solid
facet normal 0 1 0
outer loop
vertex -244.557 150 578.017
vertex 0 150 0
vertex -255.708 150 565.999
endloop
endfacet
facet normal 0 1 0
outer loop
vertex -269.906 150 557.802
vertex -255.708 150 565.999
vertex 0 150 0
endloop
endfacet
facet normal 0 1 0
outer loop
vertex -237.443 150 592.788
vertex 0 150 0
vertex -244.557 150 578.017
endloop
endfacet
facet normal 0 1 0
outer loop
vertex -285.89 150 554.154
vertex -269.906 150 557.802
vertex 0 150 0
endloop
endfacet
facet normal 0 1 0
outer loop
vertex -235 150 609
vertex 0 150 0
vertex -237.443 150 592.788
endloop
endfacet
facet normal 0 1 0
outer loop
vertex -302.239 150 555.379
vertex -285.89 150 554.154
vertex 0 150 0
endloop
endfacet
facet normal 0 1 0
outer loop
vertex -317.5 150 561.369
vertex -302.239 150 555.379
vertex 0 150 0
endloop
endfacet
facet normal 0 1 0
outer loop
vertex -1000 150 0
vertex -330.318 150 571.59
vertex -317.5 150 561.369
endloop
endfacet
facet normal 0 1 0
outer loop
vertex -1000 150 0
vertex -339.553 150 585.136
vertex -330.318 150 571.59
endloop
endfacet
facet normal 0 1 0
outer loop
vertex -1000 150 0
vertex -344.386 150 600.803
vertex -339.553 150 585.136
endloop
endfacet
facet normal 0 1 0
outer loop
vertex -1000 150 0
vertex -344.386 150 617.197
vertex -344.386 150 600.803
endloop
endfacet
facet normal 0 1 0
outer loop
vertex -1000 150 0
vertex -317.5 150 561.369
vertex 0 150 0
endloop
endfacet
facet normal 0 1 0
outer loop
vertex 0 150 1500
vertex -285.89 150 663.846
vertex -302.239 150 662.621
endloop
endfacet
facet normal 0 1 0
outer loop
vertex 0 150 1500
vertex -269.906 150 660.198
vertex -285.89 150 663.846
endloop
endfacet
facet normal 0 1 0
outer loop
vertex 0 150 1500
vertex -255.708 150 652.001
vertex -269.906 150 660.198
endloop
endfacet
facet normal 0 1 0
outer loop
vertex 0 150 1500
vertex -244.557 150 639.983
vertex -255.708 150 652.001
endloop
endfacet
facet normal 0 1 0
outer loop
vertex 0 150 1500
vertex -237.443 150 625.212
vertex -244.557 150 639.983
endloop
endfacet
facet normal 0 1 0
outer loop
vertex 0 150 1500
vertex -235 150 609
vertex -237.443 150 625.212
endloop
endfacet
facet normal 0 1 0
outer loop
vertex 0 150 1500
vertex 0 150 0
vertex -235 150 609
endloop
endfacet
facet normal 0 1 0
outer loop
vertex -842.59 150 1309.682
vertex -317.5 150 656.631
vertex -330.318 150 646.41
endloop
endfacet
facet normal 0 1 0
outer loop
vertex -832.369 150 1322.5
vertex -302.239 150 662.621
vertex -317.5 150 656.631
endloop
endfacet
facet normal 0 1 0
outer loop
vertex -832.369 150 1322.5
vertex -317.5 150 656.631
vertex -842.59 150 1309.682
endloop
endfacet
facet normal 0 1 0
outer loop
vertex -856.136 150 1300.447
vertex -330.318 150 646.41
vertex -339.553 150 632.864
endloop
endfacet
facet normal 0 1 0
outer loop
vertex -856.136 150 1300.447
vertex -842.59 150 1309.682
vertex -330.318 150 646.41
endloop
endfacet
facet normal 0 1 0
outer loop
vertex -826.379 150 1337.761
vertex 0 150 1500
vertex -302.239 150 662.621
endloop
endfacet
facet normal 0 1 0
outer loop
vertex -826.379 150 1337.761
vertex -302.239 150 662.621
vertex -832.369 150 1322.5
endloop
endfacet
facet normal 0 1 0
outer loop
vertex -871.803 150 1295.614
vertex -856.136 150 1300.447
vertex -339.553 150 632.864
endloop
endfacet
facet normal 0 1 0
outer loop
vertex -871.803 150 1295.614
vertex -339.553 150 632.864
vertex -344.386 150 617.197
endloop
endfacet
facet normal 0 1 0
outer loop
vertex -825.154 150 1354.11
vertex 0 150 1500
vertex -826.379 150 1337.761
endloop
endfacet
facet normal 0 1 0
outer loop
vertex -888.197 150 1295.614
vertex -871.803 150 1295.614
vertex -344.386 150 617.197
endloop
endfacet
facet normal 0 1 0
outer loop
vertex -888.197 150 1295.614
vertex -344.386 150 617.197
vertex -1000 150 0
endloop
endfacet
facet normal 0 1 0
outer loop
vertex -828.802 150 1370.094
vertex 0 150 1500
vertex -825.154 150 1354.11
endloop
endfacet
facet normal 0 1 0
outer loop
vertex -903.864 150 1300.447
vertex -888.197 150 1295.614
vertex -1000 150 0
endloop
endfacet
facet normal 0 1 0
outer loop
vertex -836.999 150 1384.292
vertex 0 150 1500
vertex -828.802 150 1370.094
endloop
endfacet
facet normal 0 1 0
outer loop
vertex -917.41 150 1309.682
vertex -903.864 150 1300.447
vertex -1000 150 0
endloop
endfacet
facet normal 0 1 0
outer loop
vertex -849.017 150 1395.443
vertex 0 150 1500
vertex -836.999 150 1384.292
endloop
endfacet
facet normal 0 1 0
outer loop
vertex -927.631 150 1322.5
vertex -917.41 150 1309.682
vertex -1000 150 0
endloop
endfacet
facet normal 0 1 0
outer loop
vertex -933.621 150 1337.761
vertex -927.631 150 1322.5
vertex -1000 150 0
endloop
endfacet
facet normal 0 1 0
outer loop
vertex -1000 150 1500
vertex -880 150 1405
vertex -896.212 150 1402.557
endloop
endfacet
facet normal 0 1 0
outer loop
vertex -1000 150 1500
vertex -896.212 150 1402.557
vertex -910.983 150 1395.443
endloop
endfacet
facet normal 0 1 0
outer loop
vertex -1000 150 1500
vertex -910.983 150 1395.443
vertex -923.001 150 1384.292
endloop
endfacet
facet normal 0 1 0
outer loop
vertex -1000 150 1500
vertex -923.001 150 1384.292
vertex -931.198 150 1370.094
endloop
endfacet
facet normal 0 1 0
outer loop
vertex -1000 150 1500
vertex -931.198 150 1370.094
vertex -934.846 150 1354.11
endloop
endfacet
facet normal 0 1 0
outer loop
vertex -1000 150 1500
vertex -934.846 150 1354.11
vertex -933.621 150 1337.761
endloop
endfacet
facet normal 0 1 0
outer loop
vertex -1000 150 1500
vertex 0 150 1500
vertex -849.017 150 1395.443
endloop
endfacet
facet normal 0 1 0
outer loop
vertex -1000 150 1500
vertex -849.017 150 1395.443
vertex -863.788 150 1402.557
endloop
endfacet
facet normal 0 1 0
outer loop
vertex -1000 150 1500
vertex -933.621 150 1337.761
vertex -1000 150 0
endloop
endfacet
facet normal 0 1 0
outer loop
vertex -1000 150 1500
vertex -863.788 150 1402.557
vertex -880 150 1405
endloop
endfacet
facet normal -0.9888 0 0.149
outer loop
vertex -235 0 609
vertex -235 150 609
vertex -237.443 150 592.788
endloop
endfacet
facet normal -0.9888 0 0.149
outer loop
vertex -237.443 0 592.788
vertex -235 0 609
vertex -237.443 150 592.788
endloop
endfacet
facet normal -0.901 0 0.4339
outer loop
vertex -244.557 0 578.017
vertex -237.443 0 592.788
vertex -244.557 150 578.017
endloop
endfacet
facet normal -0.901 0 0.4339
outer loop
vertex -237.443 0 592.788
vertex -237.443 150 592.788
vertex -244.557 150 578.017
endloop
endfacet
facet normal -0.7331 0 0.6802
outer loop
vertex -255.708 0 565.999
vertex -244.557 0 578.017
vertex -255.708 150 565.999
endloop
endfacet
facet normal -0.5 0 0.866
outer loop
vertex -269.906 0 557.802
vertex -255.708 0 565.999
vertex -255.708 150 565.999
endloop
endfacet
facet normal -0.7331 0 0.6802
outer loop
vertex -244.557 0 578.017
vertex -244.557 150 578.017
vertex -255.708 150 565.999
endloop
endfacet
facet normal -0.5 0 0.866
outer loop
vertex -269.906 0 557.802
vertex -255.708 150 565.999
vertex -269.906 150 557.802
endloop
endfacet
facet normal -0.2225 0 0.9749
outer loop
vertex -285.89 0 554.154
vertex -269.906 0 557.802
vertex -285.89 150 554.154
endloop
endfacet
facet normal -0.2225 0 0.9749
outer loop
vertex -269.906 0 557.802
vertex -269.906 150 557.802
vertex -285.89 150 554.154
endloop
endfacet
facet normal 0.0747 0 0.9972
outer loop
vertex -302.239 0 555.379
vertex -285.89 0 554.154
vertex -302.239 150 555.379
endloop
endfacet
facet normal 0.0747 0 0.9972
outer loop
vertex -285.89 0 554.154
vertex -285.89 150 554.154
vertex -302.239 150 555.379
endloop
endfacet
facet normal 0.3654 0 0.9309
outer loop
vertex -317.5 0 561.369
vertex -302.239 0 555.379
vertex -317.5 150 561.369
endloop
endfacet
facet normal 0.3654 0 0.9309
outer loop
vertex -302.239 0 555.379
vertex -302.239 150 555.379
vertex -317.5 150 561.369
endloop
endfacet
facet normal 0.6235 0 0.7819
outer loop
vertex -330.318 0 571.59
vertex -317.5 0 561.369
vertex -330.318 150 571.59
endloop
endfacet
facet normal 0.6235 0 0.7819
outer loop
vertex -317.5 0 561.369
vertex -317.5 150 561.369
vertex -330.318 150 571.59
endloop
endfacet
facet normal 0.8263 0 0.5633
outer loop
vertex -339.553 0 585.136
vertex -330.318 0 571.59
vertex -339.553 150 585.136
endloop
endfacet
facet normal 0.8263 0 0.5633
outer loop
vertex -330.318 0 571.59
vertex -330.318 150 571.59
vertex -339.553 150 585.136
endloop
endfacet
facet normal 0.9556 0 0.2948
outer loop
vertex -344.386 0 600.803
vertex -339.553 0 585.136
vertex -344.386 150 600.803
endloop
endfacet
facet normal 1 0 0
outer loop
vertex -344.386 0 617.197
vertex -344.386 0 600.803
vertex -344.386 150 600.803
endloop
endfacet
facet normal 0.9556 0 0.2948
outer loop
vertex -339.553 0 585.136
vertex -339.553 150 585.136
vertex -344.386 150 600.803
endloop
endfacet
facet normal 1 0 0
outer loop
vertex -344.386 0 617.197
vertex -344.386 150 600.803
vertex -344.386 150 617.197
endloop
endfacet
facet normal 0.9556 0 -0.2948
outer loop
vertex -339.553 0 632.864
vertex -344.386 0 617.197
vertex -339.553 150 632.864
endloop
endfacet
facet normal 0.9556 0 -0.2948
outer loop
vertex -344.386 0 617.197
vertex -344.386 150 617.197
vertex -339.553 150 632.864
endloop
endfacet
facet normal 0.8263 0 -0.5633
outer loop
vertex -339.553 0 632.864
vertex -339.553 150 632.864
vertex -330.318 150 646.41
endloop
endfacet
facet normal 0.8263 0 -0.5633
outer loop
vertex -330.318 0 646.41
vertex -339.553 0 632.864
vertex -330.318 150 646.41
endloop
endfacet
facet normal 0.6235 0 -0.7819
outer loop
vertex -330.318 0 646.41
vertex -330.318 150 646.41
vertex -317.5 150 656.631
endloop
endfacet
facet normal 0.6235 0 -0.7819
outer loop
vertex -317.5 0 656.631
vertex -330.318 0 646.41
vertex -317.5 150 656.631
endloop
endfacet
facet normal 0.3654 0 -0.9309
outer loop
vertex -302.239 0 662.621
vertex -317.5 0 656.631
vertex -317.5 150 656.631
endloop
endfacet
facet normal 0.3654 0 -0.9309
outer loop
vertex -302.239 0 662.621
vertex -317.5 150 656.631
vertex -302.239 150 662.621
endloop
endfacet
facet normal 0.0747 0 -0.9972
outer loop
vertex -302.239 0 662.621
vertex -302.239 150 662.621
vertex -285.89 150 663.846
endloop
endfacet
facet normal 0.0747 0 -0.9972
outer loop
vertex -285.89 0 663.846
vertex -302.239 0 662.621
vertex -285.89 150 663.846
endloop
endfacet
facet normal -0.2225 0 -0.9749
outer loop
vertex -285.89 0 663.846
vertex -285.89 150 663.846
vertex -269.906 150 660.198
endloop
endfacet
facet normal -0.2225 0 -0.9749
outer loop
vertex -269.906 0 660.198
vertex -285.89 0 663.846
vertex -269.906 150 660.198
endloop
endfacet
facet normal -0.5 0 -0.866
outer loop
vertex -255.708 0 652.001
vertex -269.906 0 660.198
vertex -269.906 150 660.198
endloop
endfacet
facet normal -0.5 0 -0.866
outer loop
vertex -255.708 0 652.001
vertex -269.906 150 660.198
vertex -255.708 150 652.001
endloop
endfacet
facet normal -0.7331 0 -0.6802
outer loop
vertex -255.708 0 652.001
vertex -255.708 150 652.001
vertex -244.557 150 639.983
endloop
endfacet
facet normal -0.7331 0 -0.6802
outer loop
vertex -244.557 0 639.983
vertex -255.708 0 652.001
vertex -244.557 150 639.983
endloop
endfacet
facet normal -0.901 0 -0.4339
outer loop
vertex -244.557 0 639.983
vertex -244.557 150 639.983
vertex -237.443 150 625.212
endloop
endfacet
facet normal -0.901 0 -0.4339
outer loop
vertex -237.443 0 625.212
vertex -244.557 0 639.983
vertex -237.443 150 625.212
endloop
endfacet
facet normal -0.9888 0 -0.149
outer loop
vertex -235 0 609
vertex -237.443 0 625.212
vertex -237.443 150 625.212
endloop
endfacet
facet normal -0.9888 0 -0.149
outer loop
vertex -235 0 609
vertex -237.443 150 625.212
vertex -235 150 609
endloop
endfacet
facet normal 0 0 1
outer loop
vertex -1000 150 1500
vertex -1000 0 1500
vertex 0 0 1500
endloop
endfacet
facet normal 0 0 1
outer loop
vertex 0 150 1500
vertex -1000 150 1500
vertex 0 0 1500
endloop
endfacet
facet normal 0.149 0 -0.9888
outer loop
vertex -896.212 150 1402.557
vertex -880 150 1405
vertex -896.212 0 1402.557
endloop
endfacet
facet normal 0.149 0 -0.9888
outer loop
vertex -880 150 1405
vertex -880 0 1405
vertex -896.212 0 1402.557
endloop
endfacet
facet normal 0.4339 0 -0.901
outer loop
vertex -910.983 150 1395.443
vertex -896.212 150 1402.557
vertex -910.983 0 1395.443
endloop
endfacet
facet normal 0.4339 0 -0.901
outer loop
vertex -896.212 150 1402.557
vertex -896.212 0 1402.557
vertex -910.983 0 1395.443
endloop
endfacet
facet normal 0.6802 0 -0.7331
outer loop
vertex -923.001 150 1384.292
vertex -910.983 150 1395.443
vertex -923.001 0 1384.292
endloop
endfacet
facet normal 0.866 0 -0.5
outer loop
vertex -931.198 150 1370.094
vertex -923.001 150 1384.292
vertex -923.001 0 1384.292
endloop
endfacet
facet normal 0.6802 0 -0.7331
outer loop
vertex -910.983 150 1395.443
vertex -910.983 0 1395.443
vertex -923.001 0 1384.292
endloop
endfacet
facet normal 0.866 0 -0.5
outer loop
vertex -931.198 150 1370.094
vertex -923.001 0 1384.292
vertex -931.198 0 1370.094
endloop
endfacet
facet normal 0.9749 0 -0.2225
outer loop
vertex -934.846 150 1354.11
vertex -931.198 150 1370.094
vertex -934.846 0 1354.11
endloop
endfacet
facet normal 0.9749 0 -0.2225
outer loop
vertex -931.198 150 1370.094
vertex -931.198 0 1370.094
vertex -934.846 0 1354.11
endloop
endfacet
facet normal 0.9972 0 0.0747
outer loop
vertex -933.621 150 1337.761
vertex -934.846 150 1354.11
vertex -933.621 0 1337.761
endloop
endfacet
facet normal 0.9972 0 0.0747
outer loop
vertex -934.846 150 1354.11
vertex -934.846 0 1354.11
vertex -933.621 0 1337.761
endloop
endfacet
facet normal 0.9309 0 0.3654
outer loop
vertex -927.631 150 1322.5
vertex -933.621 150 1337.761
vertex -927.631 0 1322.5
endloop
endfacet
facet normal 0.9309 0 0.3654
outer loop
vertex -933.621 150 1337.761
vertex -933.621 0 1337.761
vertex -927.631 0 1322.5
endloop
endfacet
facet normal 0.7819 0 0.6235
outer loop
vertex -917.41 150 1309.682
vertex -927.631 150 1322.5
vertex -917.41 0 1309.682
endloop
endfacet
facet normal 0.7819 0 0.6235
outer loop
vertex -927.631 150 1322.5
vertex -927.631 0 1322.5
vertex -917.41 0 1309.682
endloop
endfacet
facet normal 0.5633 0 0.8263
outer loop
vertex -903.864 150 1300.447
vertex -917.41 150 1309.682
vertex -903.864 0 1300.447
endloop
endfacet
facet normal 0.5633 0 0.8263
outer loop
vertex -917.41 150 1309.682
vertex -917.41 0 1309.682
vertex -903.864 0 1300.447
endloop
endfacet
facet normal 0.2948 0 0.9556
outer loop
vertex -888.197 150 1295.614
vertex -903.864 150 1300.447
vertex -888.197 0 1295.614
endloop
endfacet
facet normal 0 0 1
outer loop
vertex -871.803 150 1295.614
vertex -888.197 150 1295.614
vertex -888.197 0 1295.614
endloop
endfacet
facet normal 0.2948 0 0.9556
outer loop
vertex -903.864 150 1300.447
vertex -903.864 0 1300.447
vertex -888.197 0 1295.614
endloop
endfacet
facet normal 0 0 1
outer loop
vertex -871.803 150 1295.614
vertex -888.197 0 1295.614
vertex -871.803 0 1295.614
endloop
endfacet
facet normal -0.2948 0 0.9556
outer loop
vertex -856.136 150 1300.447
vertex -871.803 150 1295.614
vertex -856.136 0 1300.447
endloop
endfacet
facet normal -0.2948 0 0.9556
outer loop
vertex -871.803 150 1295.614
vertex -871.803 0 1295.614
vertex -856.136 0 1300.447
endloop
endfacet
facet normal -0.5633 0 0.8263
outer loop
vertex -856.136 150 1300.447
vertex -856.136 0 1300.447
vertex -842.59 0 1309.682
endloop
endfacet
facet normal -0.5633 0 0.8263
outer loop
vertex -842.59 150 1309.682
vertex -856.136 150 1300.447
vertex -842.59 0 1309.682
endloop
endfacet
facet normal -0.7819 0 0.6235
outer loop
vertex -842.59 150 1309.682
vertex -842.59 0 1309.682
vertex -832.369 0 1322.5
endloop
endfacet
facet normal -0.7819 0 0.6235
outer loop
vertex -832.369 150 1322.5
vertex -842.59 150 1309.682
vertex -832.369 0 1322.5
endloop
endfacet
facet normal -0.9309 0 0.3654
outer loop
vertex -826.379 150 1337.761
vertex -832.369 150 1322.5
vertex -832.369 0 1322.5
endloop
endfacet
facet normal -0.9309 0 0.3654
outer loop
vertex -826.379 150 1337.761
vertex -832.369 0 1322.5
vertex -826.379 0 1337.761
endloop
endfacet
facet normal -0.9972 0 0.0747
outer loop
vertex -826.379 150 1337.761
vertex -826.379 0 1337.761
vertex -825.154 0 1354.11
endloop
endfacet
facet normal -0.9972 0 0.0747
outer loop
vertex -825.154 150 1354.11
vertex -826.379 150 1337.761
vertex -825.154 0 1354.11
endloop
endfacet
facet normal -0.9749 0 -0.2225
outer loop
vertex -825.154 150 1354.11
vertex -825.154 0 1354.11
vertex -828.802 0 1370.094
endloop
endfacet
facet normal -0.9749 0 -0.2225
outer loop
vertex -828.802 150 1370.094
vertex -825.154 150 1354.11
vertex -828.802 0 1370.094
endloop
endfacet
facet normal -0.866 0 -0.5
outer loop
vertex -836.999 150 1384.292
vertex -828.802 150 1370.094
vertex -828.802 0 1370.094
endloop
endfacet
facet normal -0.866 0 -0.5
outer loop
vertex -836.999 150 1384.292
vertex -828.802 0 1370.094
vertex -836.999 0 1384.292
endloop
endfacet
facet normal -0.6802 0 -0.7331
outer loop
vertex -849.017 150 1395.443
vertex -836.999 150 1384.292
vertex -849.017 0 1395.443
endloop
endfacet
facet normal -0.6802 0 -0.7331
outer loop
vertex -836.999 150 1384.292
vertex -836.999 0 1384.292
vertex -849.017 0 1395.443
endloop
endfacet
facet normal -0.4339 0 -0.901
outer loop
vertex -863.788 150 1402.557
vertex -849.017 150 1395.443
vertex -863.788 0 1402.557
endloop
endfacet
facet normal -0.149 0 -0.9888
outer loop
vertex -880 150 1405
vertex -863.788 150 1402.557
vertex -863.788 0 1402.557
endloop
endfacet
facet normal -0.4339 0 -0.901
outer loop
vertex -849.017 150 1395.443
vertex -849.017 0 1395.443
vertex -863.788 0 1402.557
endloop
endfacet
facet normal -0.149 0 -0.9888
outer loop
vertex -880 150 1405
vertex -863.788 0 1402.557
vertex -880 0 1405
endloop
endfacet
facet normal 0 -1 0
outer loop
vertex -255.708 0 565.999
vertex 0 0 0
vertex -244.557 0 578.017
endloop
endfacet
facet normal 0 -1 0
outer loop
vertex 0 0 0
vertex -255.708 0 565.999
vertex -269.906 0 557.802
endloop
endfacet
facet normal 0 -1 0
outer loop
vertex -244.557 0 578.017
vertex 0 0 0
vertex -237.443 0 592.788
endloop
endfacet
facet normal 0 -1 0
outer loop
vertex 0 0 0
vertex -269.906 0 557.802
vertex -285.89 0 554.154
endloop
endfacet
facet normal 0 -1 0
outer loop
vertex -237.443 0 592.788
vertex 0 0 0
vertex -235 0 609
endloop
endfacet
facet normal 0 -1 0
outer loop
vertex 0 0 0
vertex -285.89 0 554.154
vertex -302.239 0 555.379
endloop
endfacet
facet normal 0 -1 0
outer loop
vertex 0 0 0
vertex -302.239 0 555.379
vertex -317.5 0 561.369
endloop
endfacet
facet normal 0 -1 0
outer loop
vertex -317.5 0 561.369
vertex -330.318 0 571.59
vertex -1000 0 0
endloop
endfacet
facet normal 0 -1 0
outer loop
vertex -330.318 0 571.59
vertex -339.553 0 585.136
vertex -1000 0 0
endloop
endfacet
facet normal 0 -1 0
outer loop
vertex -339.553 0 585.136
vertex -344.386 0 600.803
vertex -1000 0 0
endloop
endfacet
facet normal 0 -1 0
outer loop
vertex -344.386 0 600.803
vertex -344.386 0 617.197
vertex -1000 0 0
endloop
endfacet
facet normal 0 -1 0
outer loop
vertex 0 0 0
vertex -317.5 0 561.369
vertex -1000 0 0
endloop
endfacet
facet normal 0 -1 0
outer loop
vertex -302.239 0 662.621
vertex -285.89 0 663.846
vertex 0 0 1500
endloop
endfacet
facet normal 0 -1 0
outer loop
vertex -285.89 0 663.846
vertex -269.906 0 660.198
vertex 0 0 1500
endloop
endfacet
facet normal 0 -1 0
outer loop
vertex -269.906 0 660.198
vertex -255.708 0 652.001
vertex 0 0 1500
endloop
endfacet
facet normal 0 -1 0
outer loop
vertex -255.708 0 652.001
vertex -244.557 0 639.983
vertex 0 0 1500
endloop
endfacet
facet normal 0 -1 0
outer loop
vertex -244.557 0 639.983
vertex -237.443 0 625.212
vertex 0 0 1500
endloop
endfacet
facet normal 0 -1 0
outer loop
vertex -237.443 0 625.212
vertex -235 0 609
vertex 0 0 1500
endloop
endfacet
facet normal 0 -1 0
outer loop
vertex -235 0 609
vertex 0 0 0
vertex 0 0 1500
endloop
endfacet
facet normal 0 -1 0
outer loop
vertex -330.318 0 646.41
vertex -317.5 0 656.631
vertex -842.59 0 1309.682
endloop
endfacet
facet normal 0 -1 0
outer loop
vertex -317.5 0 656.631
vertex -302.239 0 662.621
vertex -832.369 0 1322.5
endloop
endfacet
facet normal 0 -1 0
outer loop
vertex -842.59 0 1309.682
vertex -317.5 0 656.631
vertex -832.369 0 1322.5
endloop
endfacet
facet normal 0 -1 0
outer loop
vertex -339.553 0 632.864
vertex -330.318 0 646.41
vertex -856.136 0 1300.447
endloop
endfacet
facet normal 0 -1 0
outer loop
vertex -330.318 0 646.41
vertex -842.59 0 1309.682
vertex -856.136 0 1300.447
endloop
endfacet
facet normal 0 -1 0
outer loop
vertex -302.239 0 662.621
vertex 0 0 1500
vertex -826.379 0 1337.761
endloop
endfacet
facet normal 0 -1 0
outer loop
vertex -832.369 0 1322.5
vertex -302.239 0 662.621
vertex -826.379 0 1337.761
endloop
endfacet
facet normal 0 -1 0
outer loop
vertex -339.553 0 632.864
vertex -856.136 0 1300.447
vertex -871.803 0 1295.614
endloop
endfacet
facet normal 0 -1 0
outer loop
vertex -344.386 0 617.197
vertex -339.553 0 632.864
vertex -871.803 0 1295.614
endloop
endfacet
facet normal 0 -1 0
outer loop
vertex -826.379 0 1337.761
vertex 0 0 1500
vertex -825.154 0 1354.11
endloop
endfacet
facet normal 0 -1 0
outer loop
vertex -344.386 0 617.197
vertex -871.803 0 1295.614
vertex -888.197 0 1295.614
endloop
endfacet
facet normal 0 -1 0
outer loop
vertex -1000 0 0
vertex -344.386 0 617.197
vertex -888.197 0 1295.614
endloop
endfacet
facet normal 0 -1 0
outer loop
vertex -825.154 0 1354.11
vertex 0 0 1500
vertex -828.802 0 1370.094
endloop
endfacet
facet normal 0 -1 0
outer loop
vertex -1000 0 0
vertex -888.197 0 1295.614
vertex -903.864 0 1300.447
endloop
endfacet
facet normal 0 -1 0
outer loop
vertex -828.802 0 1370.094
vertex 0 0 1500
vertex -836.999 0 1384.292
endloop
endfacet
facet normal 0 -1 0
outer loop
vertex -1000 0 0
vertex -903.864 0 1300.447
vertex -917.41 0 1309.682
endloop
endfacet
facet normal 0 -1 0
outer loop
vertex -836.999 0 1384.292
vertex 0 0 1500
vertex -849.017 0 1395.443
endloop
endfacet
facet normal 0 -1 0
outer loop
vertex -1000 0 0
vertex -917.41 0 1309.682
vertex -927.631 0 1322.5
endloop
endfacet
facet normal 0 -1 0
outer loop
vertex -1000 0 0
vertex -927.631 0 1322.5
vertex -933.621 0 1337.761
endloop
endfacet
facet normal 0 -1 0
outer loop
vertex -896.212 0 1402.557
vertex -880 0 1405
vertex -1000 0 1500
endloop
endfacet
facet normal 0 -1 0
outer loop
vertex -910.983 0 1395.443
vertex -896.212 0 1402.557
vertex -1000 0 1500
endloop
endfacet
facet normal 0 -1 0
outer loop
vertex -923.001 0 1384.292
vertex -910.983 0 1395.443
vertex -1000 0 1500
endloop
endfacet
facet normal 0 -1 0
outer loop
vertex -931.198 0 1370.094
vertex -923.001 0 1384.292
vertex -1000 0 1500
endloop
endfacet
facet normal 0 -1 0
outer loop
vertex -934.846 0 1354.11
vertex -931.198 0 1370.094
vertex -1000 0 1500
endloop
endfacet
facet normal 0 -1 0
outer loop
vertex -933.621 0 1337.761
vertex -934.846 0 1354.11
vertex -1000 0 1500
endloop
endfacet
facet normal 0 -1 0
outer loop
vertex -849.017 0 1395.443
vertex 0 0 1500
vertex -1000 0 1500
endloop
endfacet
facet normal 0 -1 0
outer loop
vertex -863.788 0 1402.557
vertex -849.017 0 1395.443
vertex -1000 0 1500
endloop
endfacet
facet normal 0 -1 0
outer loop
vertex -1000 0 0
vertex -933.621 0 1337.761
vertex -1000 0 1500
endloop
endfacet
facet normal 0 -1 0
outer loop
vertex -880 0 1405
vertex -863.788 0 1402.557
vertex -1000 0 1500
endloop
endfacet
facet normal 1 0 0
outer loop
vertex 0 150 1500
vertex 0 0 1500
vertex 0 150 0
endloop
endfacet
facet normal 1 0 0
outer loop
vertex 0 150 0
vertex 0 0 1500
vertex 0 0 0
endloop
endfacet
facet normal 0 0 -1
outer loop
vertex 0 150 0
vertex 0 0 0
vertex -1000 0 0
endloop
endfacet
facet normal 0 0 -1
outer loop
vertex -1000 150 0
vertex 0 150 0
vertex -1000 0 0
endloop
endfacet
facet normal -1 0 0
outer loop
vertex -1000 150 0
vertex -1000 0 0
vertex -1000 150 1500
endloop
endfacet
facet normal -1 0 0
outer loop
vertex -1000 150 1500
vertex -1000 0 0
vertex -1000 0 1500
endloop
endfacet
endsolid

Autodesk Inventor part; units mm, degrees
ref_plane "YZ Plane" through (0, 0, 0) normal (1, 0, 0) x (0, 1, 0)
ref_plane "XZ Plane" through (0, 0, 0) normal (0, 1, 0) x (-1, 0, 0)
ref_plane "XY Plane" through (0, 0, 0) normal (0, 0, 1) x (1, 0, 0)
sketch "Sketch1" plane through (0, 0, 0) normal (0, 1, 0) x (-1, 0, 0)
  line L0 (0, 0) -> (1000, 0)
  line L1 (1000, 0) -> (1000, 1500)
  line L2 (1000, 1500) -> (0, 1500)
  line L3 (0, 1500) -> (0, 0)
  dimension "d0" = 1000
  dimension "d1" = 1500
extrude "base" add sketch "Sketch1" along normal blind 150
sketch "Sketch2" plane through (0, 150, 0) normal (0, 1, 0) x (1, 0, 0)
  circle A0 centre (-290, -609) radius 55
  line L0 (0, 0) -> (-1000, 0) projected
  line L1 (0, -1500) -> (0, 0) projected
  dimension "d4" = 110
  dimension "d38" = 609
  dimension "d62" = 290
extrude "air" cut sketch "Sketch2" against normal through all
sketch "Sketch6" plane through (0, 150, 0) normal (0, 1, 0) x (1, 0, 0)
  line L0 (-1000, 0) -> (-1000, -1500) projected
  circle A0 centre (-880, -1350) radius 55
  line L1 (-1000, -1500) -> (0, -1500) projected
  dimension "d56" = 110
  dimension "d60" = 150
  dimension "d61" = 120
hole "air2" at (-880, 150, 1350) direction (0, -1, 0) diameter 110 end through all
properties part number "plinth" material "Concrete"
